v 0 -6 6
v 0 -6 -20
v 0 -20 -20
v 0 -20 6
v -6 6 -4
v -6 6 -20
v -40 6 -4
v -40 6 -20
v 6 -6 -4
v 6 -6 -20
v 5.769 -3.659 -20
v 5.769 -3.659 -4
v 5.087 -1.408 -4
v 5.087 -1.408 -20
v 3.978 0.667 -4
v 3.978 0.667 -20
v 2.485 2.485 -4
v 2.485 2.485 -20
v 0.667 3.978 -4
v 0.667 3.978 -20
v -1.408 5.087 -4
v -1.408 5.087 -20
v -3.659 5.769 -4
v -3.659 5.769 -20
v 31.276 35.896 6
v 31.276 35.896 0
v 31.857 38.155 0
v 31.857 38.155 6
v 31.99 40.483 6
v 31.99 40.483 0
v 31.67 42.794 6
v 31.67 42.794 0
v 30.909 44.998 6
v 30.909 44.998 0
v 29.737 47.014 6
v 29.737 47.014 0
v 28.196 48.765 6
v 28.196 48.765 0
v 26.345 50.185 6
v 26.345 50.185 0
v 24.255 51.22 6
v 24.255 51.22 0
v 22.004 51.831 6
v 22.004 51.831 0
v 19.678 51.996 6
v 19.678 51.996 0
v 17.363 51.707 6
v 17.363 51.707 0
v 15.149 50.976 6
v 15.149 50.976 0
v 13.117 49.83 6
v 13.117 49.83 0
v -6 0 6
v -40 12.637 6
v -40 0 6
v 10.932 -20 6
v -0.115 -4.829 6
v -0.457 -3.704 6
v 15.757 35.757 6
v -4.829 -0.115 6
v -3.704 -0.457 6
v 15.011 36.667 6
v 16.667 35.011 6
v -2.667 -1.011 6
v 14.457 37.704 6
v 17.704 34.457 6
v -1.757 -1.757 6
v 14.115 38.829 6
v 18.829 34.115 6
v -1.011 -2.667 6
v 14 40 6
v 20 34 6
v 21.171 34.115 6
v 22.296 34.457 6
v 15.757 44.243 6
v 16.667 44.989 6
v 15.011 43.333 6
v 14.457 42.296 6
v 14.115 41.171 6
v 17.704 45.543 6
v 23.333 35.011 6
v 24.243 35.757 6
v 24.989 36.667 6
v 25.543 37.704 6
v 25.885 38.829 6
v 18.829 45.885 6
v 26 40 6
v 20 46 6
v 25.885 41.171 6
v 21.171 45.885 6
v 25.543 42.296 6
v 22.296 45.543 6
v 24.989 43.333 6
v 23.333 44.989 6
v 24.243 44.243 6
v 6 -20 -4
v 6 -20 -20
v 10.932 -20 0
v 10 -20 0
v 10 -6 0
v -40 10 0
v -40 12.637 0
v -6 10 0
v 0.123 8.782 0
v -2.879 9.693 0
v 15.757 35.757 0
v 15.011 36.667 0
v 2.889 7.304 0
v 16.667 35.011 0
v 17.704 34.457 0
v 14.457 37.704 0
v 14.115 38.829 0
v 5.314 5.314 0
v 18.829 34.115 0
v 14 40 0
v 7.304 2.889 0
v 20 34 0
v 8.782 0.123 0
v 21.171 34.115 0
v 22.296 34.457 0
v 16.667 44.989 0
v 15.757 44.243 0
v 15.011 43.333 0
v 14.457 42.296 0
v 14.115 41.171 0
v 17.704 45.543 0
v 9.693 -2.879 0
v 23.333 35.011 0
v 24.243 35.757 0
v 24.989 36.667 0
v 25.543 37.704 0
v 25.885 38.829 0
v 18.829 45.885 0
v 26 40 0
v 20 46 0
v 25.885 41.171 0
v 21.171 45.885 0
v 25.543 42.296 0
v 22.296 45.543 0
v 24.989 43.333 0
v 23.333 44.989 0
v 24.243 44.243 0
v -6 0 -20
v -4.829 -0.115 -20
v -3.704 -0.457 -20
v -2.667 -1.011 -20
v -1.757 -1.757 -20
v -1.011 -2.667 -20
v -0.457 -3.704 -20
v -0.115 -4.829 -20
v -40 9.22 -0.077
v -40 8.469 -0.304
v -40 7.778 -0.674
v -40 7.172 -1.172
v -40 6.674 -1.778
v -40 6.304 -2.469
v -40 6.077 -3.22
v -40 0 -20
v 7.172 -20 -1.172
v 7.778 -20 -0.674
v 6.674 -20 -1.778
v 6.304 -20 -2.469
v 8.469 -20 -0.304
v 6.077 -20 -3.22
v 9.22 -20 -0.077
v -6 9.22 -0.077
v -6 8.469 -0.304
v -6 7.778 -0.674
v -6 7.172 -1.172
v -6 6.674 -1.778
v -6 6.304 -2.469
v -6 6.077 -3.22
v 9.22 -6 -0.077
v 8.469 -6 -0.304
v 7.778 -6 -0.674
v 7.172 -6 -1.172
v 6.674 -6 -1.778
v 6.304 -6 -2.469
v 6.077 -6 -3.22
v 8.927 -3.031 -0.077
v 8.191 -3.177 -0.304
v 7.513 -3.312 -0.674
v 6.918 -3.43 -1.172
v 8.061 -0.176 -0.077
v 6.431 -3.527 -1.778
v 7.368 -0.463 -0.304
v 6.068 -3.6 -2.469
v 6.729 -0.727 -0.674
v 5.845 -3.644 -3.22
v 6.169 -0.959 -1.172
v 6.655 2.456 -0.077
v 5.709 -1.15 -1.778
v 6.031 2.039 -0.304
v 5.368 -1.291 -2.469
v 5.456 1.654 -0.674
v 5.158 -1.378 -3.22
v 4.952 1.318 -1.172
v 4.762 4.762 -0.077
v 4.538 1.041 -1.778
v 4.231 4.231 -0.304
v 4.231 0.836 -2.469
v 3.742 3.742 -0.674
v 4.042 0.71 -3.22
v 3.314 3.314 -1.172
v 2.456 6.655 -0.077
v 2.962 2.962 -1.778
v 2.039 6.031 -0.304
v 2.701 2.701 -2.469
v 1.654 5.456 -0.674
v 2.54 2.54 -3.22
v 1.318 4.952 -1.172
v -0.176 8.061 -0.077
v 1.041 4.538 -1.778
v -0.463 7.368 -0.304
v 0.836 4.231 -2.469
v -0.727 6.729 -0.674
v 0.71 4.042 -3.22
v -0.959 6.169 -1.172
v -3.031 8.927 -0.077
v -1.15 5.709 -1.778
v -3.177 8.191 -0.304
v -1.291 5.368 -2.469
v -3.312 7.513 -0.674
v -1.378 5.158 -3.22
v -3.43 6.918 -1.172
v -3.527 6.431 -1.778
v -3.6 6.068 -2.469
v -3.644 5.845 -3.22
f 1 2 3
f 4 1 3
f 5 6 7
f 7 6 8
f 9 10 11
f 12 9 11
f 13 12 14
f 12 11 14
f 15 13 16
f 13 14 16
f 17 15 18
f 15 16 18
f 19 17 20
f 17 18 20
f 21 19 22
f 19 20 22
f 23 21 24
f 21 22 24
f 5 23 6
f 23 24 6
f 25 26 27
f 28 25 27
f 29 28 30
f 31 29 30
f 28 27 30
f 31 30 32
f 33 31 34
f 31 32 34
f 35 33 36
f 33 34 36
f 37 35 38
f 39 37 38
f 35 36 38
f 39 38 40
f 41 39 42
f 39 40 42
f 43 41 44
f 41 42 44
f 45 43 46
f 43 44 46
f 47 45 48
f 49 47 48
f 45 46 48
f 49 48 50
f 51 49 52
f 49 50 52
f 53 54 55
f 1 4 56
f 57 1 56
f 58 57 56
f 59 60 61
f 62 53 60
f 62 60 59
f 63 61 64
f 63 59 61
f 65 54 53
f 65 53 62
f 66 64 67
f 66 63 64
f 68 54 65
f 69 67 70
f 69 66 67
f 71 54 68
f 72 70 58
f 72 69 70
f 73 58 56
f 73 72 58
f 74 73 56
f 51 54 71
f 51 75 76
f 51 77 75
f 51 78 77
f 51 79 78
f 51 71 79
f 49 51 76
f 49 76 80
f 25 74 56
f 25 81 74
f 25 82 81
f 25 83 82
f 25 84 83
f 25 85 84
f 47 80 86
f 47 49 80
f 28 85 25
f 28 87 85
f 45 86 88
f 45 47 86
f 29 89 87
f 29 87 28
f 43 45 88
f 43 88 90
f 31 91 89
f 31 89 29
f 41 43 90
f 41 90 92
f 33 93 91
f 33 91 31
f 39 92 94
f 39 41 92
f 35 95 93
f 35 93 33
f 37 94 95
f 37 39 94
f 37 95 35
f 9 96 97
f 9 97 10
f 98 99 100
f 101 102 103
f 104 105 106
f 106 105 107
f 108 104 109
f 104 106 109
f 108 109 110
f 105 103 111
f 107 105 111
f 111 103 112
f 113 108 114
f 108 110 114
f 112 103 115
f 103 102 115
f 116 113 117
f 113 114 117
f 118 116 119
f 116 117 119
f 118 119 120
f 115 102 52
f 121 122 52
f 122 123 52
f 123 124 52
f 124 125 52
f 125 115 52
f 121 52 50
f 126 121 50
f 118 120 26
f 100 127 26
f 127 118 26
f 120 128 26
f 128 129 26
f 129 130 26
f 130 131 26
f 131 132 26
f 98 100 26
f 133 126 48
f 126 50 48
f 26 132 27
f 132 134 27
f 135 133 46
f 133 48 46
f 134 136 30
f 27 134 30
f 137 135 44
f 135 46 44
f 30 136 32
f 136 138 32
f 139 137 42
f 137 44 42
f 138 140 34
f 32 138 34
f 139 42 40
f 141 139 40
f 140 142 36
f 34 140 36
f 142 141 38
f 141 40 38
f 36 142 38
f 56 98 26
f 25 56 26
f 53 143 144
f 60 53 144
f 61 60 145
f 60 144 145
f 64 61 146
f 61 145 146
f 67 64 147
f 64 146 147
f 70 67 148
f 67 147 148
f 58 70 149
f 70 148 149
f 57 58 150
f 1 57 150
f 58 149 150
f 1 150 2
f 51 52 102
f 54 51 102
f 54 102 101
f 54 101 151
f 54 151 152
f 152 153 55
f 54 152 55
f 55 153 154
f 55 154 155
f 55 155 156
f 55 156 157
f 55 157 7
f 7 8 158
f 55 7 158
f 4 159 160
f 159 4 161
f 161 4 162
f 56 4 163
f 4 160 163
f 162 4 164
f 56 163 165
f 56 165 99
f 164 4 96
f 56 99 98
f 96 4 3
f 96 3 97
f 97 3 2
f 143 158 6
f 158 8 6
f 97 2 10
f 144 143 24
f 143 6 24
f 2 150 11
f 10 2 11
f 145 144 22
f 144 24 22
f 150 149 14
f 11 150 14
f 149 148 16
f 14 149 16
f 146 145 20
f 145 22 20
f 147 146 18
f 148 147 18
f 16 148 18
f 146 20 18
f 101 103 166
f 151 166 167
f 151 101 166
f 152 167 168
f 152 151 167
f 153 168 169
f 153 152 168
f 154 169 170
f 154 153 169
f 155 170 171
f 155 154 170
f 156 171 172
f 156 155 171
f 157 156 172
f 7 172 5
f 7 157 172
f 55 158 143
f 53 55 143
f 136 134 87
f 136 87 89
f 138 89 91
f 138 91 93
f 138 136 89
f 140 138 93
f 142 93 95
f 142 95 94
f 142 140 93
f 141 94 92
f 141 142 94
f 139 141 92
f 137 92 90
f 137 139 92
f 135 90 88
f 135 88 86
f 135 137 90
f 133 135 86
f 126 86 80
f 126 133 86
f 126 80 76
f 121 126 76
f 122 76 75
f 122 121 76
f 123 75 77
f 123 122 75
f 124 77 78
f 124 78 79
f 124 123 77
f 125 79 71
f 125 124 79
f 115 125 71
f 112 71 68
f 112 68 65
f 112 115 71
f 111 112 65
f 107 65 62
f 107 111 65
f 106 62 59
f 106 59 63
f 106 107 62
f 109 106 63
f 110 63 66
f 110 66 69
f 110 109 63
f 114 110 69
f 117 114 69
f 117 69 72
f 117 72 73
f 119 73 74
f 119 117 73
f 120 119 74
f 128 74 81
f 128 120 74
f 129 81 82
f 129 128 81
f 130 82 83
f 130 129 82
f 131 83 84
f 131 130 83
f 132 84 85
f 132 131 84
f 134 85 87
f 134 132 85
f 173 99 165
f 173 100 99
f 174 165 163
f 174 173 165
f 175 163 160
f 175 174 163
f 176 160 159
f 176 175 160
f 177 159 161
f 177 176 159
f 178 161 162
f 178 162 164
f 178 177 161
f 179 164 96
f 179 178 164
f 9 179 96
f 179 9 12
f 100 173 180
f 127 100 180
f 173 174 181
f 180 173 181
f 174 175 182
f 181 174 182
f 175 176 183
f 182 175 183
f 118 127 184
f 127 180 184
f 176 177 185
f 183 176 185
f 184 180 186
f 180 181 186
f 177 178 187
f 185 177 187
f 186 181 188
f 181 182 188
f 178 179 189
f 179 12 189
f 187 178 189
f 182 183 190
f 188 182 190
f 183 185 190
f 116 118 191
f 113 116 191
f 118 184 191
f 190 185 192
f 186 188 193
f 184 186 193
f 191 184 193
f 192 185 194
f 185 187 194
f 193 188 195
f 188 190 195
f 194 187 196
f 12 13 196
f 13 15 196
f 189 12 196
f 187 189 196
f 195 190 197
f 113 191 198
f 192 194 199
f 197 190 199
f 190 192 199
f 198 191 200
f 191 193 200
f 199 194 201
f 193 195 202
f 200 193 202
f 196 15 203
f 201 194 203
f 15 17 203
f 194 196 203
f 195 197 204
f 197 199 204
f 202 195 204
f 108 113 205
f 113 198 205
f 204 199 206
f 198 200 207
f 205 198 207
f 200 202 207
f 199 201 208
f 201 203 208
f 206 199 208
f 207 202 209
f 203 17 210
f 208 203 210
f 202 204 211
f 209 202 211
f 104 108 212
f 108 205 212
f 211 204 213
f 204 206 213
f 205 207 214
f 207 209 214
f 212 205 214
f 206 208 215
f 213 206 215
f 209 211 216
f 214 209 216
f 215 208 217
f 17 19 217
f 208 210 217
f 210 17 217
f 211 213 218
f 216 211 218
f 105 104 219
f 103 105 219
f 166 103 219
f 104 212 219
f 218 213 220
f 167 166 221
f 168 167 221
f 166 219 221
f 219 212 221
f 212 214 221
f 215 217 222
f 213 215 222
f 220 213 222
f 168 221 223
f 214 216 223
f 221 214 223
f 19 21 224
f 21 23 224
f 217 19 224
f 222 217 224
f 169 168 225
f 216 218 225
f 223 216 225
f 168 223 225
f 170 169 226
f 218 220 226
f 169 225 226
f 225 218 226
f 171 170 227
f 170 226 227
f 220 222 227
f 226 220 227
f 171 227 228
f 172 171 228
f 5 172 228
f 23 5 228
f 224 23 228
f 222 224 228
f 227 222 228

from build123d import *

# Parameters (mm, degrees)
SKETCH_1_R      = 6
EXTRUDE_1_DEPTH = 6
EXTRUDE_START   = -20
EXTRUDE_2_DEPTH = 20
FILLET_1_R      = 4


with BuildPart() as part:
    # Эскиз1 → Бобышка-Вытянуть1 (new body)
    with BuildSketch(Plane.XY):
        with BuildLine():
            Line((-40, 0), (-6, 0))
            ThreePointArc((-6, 0), (-1.757359313, -1.757359313), (0, -6))
            Line((0, -6), (0, -20))
            Line((0, -20), (10.931919214, -20))
            Line((10.931919214, -20), (31.276311449, 35.89575828))
            ThreePointArc((31.276311449, 35.89575828), (27.305137148, 49.520240083), (13.117082764, 49.829824531))
            Line((13.117082764, 49.829824531), (-40, 12.636842773))
            Line((-40, 12.636842773), (-40, 0))
        make_face()
        with Locations((20, 40)):
            Circle(SKETCH_1_R, mode=Mode.SUBTRACT)
    extrude(amount=EXTRUDE_1_DEPTH)

    # Эскиз2 → Бобышка-Вытянуть2 (add)
    with BuildSketch(Plane.XY.offset(EXTRUDE_START)):
        with BuildLine():
            Line((-40, 0), (-6, 0))
            ThreePointArc((-6, 0), (-1.757359313, -1.757359313), (0, -6))
            Line((0, -6), (0, -20))
            Line((0, -20), (6, -20))
            Line((6, -20), (6, -6))
            ThreePointArc((6, -6), (2.485281374, 2.485281374), (-6, 6))
            Line((-6, 6), (-40, 6))
            Line((-40, 6), (-40, 0))
        make_face()
    extrude(amount=EXTRUDE_2_DEPTH)

    # Скругление1
    fillet_1_edges = [part.edges().sort_by_distance(p)[0] for p in [
        (6, -13, 0),
        (2.485281374, 2.485281374, 0),
        (-23, 6, 0),
    ]]
    fillet(fillet_1_edges, radius=FILLET_1_R)


solid = part.part
